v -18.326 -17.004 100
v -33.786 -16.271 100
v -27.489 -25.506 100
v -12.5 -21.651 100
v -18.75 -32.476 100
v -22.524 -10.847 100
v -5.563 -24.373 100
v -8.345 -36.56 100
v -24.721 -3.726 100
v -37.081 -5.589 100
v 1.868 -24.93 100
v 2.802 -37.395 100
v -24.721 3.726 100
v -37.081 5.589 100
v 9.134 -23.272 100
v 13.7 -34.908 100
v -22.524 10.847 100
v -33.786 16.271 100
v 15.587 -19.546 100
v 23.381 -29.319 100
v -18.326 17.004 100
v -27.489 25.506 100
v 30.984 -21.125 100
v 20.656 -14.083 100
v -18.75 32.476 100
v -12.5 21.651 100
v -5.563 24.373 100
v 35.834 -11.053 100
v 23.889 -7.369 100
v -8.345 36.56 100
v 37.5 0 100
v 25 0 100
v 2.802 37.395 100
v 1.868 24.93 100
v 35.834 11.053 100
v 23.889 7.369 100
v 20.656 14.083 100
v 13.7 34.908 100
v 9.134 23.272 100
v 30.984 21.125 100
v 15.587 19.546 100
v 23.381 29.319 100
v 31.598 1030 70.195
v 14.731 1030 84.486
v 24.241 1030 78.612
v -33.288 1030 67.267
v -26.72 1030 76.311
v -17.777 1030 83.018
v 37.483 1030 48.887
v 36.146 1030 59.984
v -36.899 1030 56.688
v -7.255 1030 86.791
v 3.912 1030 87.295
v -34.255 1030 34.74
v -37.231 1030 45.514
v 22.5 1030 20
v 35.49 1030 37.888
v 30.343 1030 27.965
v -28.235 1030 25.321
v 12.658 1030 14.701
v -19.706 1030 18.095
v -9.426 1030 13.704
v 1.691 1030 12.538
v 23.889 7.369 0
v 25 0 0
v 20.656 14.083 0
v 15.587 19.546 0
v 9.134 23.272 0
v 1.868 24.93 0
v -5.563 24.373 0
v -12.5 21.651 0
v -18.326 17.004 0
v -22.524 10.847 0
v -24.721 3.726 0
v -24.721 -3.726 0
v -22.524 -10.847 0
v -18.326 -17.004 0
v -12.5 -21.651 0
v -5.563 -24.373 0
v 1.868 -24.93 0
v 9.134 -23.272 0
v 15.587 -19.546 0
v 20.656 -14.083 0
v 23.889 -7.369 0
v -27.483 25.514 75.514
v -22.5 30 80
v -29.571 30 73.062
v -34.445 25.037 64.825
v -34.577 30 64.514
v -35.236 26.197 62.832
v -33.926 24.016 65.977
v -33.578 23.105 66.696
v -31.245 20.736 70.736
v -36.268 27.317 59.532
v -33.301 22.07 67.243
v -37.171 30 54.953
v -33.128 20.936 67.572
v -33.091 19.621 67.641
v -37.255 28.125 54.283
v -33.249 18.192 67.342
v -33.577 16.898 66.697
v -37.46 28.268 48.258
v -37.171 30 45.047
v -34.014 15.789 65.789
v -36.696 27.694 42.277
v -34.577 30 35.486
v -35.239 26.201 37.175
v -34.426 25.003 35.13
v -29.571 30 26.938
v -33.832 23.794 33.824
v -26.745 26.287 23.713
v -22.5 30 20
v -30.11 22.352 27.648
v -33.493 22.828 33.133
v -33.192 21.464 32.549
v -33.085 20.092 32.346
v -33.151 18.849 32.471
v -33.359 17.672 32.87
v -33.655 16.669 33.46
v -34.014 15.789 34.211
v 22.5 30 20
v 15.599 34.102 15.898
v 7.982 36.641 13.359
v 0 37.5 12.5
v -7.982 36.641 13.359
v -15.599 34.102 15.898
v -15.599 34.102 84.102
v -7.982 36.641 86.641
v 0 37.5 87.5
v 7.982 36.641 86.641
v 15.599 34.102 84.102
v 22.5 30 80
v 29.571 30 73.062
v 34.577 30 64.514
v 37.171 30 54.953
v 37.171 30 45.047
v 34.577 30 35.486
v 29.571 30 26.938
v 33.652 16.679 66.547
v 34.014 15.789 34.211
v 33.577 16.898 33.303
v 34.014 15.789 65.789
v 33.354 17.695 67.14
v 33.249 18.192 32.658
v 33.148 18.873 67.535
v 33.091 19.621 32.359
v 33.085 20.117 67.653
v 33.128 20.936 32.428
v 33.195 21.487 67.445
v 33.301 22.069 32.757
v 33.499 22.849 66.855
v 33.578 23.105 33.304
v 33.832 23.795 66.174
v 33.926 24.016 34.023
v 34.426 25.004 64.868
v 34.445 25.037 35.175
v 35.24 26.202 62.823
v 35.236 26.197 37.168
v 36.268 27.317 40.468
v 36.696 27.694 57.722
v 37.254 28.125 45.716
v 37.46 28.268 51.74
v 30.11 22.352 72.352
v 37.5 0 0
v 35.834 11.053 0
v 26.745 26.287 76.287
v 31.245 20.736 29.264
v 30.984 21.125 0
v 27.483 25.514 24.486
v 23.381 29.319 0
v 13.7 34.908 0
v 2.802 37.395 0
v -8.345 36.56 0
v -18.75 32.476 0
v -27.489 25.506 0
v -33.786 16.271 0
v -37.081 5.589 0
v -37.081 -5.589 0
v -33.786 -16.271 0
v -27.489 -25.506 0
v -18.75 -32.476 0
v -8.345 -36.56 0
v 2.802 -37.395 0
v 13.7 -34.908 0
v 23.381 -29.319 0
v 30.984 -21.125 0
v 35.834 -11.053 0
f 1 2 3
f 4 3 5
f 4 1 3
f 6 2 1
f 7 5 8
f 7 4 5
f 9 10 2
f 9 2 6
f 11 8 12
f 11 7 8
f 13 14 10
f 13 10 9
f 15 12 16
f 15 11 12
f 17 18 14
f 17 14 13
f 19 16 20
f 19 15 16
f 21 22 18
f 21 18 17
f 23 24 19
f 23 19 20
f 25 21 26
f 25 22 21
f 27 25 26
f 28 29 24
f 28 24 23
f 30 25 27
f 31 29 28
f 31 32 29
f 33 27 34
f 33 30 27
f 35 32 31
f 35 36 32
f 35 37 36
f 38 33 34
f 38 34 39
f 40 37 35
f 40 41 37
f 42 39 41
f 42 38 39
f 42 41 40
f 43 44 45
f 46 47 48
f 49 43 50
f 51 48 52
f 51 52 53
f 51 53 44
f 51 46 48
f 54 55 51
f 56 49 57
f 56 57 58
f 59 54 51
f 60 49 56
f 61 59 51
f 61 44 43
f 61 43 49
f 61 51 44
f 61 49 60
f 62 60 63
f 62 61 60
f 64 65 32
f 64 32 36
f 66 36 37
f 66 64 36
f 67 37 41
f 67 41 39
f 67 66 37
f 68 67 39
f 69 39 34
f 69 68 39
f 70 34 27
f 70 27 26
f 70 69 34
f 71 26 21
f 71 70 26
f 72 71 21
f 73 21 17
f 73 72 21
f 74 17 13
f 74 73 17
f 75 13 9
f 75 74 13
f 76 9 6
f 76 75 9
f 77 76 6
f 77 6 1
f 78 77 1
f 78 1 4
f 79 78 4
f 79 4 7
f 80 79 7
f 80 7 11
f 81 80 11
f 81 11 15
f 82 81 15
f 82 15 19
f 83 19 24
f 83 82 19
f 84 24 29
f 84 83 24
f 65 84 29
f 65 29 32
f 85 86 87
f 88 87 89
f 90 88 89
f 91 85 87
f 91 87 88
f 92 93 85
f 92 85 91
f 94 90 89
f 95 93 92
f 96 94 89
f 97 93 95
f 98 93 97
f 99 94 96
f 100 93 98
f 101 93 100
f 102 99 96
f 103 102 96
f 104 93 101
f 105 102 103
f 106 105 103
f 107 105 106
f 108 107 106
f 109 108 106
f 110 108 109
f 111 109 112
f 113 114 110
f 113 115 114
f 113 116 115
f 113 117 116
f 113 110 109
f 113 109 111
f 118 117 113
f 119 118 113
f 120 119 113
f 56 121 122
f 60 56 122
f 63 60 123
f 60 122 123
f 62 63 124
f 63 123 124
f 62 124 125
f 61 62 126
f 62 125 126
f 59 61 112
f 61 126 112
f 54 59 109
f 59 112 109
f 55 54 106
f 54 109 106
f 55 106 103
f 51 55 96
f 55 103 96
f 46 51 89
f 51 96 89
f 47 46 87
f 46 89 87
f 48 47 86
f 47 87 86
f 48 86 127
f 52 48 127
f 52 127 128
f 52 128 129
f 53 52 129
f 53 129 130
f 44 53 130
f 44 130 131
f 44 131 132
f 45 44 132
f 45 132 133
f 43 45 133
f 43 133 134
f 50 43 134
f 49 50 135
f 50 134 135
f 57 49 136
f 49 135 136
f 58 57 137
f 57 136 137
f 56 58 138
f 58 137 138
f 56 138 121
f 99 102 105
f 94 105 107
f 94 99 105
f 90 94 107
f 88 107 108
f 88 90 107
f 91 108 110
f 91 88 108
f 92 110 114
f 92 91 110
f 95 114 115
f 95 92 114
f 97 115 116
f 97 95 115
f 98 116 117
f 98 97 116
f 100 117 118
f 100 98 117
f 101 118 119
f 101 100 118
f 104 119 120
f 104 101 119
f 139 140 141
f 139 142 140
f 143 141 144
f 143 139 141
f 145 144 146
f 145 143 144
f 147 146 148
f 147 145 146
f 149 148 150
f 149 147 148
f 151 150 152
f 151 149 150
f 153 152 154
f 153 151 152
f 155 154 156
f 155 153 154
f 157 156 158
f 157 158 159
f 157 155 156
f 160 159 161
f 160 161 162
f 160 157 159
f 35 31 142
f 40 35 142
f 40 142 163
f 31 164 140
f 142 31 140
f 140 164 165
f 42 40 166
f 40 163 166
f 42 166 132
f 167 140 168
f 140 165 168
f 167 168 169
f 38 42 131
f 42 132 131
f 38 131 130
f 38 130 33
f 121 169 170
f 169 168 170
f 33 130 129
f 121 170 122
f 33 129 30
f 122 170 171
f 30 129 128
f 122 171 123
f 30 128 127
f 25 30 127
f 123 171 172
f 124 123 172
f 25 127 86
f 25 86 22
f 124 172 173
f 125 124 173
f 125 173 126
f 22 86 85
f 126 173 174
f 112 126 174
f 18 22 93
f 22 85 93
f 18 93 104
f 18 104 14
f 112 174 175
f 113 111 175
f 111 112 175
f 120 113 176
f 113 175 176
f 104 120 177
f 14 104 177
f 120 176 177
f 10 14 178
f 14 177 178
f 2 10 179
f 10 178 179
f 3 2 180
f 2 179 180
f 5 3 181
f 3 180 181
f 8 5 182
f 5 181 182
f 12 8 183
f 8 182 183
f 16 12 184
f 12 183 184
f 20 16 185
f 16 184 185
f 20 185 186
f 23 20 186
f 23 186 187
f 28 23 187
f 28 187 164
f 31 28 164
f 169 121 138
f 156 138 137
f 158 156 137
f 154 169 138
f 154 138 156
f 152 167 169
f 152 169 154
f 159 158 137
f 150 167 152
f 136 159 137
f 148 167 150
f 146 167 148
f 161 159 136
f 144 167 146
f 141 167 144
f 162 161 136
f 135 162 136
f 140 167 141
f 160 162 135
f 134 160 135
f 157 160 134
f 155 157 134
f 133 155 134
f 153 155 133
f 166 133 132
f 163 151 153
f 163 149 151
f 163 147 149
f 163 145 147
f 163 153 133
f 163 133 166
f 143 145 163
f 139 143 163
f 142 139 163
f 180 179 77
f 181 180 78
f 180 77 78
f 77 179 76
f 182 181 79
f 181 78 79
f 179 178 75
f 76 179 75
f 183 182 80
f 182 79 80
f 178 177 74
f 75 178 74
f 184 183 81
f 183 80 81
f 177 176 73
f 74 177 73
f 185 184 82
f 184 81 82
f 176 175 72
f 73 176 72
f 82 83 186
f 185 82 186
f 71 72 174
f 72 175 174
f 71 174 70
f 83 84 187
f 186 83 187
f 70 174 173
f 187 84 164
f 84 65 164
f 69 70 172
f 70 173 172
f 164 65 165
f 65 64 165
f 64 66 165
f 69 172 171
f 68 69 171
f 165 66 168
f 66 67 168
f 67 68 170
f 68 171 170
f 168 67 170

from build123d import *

# Parameters (mm, degrees)
SKETCH1_R           = 37.5
SKETCH1_R_2         = 25
BOSS_EXTRUDE1_DEPTH = 100
BOSS_EXTRUDE2_START = 30
SKETCH2_R           = 37.5
BOSS_EXTRUDE2_DEPTH = 1000
FILLET1_R           = 10


with BuildPart() as part:
    # Sketch1 → Boss-Extrude1 (new body)
    with BuildSketch(Plane.XY):
        Circle(SKETCH1_R)
        Circle(SKETCH1_R_2, mode=Mode.SUBTRACT)
    extrude(amount=BOSS_EXTRUDE1_DEPTH)

    # Sketch2 → Boss-Extrude2 (add)
    with BuildSketch(Plane(origin=(0, 0, 0), x_dir=(1, 0, 0), z_dir=(0, 1, 0)).offset(BOSS_EXTRUDE2_START)):
        with Locations(Location((0, -50, 0), (0, 0, 53.130102354))):
            Circle(SKETCH2_R)
    extrude(amount=BOSS_EXTRUDE2_DEPTH)

    # Fillet1
    # the kernel refuses this fillet: 10 mm, written as the material it adds along each edge
    with BuildSketch(Plane(origin=(22.5, 30, 131.460549623), x_dir=(0.6295317231300945, -0.7769747805256321, 0), z_dir=(0, 0, -1))) as fillet1_piece_1_section:
        with BuildLine():
            CenterArc((20.728167196, -9.698102468), FILLET1_R, 104.114519992, 114.90106237)
            Line((12.958419391, -15.993419699), (0, 0))
            ThreePointArc((0, 0), (9.144779645, -1.132115744), (18.289559291, 0))
        make_face()
    fillet1_piece_1 = extrude(amount=162.921099245, mode=Mode.PRIVATE)
    fillet1_piece_1 = fillet1_piece_1 & Plane(origin=(0, 26.517376083, 50), x_dir=(0.6000000000021779, 0, -0.7999999999983666), z_dir=(0, -1, 0)) * Cylinder(37.5, 400, mode=Mode.PRIVATE)
    add(fillet1_piece_1)
    with BuildSketch(Plane(origin=(-22.5, 30, 131.460549623), x_dir=(-0.6295317231300945, -0.7769747805256321, 0), z_dir=(0, 0, -1))) as fillet1_piece_2_section:
        with BuildLine():
            CenterArc((20.728167196, 9.698102468), FILLET1_R, 140.984417638, 114.90106237)
            Line((12.958419391, 15.993419699), (0, 0))
            ThreePointArc((0, 0), (9.144779645, 1.132115744), (18.289559291, 0))
        make_face()
    fillet1_piece_2 = extrude(amount=162.921099245, mode=Mode.PRIVATE)
    fillet1_piece_2 = fillet1_piece_2 & Plane(origin=(0, 26.517339573, 50), x_dir=(0.6000000000021779, 0, -0.7999999999983666), z_dir=(0, -1, 0)) * Cylinder(37.5, 400, mode=Mode.PRIVATE)
    add(fillet1_piece_2)


solid = part.part
